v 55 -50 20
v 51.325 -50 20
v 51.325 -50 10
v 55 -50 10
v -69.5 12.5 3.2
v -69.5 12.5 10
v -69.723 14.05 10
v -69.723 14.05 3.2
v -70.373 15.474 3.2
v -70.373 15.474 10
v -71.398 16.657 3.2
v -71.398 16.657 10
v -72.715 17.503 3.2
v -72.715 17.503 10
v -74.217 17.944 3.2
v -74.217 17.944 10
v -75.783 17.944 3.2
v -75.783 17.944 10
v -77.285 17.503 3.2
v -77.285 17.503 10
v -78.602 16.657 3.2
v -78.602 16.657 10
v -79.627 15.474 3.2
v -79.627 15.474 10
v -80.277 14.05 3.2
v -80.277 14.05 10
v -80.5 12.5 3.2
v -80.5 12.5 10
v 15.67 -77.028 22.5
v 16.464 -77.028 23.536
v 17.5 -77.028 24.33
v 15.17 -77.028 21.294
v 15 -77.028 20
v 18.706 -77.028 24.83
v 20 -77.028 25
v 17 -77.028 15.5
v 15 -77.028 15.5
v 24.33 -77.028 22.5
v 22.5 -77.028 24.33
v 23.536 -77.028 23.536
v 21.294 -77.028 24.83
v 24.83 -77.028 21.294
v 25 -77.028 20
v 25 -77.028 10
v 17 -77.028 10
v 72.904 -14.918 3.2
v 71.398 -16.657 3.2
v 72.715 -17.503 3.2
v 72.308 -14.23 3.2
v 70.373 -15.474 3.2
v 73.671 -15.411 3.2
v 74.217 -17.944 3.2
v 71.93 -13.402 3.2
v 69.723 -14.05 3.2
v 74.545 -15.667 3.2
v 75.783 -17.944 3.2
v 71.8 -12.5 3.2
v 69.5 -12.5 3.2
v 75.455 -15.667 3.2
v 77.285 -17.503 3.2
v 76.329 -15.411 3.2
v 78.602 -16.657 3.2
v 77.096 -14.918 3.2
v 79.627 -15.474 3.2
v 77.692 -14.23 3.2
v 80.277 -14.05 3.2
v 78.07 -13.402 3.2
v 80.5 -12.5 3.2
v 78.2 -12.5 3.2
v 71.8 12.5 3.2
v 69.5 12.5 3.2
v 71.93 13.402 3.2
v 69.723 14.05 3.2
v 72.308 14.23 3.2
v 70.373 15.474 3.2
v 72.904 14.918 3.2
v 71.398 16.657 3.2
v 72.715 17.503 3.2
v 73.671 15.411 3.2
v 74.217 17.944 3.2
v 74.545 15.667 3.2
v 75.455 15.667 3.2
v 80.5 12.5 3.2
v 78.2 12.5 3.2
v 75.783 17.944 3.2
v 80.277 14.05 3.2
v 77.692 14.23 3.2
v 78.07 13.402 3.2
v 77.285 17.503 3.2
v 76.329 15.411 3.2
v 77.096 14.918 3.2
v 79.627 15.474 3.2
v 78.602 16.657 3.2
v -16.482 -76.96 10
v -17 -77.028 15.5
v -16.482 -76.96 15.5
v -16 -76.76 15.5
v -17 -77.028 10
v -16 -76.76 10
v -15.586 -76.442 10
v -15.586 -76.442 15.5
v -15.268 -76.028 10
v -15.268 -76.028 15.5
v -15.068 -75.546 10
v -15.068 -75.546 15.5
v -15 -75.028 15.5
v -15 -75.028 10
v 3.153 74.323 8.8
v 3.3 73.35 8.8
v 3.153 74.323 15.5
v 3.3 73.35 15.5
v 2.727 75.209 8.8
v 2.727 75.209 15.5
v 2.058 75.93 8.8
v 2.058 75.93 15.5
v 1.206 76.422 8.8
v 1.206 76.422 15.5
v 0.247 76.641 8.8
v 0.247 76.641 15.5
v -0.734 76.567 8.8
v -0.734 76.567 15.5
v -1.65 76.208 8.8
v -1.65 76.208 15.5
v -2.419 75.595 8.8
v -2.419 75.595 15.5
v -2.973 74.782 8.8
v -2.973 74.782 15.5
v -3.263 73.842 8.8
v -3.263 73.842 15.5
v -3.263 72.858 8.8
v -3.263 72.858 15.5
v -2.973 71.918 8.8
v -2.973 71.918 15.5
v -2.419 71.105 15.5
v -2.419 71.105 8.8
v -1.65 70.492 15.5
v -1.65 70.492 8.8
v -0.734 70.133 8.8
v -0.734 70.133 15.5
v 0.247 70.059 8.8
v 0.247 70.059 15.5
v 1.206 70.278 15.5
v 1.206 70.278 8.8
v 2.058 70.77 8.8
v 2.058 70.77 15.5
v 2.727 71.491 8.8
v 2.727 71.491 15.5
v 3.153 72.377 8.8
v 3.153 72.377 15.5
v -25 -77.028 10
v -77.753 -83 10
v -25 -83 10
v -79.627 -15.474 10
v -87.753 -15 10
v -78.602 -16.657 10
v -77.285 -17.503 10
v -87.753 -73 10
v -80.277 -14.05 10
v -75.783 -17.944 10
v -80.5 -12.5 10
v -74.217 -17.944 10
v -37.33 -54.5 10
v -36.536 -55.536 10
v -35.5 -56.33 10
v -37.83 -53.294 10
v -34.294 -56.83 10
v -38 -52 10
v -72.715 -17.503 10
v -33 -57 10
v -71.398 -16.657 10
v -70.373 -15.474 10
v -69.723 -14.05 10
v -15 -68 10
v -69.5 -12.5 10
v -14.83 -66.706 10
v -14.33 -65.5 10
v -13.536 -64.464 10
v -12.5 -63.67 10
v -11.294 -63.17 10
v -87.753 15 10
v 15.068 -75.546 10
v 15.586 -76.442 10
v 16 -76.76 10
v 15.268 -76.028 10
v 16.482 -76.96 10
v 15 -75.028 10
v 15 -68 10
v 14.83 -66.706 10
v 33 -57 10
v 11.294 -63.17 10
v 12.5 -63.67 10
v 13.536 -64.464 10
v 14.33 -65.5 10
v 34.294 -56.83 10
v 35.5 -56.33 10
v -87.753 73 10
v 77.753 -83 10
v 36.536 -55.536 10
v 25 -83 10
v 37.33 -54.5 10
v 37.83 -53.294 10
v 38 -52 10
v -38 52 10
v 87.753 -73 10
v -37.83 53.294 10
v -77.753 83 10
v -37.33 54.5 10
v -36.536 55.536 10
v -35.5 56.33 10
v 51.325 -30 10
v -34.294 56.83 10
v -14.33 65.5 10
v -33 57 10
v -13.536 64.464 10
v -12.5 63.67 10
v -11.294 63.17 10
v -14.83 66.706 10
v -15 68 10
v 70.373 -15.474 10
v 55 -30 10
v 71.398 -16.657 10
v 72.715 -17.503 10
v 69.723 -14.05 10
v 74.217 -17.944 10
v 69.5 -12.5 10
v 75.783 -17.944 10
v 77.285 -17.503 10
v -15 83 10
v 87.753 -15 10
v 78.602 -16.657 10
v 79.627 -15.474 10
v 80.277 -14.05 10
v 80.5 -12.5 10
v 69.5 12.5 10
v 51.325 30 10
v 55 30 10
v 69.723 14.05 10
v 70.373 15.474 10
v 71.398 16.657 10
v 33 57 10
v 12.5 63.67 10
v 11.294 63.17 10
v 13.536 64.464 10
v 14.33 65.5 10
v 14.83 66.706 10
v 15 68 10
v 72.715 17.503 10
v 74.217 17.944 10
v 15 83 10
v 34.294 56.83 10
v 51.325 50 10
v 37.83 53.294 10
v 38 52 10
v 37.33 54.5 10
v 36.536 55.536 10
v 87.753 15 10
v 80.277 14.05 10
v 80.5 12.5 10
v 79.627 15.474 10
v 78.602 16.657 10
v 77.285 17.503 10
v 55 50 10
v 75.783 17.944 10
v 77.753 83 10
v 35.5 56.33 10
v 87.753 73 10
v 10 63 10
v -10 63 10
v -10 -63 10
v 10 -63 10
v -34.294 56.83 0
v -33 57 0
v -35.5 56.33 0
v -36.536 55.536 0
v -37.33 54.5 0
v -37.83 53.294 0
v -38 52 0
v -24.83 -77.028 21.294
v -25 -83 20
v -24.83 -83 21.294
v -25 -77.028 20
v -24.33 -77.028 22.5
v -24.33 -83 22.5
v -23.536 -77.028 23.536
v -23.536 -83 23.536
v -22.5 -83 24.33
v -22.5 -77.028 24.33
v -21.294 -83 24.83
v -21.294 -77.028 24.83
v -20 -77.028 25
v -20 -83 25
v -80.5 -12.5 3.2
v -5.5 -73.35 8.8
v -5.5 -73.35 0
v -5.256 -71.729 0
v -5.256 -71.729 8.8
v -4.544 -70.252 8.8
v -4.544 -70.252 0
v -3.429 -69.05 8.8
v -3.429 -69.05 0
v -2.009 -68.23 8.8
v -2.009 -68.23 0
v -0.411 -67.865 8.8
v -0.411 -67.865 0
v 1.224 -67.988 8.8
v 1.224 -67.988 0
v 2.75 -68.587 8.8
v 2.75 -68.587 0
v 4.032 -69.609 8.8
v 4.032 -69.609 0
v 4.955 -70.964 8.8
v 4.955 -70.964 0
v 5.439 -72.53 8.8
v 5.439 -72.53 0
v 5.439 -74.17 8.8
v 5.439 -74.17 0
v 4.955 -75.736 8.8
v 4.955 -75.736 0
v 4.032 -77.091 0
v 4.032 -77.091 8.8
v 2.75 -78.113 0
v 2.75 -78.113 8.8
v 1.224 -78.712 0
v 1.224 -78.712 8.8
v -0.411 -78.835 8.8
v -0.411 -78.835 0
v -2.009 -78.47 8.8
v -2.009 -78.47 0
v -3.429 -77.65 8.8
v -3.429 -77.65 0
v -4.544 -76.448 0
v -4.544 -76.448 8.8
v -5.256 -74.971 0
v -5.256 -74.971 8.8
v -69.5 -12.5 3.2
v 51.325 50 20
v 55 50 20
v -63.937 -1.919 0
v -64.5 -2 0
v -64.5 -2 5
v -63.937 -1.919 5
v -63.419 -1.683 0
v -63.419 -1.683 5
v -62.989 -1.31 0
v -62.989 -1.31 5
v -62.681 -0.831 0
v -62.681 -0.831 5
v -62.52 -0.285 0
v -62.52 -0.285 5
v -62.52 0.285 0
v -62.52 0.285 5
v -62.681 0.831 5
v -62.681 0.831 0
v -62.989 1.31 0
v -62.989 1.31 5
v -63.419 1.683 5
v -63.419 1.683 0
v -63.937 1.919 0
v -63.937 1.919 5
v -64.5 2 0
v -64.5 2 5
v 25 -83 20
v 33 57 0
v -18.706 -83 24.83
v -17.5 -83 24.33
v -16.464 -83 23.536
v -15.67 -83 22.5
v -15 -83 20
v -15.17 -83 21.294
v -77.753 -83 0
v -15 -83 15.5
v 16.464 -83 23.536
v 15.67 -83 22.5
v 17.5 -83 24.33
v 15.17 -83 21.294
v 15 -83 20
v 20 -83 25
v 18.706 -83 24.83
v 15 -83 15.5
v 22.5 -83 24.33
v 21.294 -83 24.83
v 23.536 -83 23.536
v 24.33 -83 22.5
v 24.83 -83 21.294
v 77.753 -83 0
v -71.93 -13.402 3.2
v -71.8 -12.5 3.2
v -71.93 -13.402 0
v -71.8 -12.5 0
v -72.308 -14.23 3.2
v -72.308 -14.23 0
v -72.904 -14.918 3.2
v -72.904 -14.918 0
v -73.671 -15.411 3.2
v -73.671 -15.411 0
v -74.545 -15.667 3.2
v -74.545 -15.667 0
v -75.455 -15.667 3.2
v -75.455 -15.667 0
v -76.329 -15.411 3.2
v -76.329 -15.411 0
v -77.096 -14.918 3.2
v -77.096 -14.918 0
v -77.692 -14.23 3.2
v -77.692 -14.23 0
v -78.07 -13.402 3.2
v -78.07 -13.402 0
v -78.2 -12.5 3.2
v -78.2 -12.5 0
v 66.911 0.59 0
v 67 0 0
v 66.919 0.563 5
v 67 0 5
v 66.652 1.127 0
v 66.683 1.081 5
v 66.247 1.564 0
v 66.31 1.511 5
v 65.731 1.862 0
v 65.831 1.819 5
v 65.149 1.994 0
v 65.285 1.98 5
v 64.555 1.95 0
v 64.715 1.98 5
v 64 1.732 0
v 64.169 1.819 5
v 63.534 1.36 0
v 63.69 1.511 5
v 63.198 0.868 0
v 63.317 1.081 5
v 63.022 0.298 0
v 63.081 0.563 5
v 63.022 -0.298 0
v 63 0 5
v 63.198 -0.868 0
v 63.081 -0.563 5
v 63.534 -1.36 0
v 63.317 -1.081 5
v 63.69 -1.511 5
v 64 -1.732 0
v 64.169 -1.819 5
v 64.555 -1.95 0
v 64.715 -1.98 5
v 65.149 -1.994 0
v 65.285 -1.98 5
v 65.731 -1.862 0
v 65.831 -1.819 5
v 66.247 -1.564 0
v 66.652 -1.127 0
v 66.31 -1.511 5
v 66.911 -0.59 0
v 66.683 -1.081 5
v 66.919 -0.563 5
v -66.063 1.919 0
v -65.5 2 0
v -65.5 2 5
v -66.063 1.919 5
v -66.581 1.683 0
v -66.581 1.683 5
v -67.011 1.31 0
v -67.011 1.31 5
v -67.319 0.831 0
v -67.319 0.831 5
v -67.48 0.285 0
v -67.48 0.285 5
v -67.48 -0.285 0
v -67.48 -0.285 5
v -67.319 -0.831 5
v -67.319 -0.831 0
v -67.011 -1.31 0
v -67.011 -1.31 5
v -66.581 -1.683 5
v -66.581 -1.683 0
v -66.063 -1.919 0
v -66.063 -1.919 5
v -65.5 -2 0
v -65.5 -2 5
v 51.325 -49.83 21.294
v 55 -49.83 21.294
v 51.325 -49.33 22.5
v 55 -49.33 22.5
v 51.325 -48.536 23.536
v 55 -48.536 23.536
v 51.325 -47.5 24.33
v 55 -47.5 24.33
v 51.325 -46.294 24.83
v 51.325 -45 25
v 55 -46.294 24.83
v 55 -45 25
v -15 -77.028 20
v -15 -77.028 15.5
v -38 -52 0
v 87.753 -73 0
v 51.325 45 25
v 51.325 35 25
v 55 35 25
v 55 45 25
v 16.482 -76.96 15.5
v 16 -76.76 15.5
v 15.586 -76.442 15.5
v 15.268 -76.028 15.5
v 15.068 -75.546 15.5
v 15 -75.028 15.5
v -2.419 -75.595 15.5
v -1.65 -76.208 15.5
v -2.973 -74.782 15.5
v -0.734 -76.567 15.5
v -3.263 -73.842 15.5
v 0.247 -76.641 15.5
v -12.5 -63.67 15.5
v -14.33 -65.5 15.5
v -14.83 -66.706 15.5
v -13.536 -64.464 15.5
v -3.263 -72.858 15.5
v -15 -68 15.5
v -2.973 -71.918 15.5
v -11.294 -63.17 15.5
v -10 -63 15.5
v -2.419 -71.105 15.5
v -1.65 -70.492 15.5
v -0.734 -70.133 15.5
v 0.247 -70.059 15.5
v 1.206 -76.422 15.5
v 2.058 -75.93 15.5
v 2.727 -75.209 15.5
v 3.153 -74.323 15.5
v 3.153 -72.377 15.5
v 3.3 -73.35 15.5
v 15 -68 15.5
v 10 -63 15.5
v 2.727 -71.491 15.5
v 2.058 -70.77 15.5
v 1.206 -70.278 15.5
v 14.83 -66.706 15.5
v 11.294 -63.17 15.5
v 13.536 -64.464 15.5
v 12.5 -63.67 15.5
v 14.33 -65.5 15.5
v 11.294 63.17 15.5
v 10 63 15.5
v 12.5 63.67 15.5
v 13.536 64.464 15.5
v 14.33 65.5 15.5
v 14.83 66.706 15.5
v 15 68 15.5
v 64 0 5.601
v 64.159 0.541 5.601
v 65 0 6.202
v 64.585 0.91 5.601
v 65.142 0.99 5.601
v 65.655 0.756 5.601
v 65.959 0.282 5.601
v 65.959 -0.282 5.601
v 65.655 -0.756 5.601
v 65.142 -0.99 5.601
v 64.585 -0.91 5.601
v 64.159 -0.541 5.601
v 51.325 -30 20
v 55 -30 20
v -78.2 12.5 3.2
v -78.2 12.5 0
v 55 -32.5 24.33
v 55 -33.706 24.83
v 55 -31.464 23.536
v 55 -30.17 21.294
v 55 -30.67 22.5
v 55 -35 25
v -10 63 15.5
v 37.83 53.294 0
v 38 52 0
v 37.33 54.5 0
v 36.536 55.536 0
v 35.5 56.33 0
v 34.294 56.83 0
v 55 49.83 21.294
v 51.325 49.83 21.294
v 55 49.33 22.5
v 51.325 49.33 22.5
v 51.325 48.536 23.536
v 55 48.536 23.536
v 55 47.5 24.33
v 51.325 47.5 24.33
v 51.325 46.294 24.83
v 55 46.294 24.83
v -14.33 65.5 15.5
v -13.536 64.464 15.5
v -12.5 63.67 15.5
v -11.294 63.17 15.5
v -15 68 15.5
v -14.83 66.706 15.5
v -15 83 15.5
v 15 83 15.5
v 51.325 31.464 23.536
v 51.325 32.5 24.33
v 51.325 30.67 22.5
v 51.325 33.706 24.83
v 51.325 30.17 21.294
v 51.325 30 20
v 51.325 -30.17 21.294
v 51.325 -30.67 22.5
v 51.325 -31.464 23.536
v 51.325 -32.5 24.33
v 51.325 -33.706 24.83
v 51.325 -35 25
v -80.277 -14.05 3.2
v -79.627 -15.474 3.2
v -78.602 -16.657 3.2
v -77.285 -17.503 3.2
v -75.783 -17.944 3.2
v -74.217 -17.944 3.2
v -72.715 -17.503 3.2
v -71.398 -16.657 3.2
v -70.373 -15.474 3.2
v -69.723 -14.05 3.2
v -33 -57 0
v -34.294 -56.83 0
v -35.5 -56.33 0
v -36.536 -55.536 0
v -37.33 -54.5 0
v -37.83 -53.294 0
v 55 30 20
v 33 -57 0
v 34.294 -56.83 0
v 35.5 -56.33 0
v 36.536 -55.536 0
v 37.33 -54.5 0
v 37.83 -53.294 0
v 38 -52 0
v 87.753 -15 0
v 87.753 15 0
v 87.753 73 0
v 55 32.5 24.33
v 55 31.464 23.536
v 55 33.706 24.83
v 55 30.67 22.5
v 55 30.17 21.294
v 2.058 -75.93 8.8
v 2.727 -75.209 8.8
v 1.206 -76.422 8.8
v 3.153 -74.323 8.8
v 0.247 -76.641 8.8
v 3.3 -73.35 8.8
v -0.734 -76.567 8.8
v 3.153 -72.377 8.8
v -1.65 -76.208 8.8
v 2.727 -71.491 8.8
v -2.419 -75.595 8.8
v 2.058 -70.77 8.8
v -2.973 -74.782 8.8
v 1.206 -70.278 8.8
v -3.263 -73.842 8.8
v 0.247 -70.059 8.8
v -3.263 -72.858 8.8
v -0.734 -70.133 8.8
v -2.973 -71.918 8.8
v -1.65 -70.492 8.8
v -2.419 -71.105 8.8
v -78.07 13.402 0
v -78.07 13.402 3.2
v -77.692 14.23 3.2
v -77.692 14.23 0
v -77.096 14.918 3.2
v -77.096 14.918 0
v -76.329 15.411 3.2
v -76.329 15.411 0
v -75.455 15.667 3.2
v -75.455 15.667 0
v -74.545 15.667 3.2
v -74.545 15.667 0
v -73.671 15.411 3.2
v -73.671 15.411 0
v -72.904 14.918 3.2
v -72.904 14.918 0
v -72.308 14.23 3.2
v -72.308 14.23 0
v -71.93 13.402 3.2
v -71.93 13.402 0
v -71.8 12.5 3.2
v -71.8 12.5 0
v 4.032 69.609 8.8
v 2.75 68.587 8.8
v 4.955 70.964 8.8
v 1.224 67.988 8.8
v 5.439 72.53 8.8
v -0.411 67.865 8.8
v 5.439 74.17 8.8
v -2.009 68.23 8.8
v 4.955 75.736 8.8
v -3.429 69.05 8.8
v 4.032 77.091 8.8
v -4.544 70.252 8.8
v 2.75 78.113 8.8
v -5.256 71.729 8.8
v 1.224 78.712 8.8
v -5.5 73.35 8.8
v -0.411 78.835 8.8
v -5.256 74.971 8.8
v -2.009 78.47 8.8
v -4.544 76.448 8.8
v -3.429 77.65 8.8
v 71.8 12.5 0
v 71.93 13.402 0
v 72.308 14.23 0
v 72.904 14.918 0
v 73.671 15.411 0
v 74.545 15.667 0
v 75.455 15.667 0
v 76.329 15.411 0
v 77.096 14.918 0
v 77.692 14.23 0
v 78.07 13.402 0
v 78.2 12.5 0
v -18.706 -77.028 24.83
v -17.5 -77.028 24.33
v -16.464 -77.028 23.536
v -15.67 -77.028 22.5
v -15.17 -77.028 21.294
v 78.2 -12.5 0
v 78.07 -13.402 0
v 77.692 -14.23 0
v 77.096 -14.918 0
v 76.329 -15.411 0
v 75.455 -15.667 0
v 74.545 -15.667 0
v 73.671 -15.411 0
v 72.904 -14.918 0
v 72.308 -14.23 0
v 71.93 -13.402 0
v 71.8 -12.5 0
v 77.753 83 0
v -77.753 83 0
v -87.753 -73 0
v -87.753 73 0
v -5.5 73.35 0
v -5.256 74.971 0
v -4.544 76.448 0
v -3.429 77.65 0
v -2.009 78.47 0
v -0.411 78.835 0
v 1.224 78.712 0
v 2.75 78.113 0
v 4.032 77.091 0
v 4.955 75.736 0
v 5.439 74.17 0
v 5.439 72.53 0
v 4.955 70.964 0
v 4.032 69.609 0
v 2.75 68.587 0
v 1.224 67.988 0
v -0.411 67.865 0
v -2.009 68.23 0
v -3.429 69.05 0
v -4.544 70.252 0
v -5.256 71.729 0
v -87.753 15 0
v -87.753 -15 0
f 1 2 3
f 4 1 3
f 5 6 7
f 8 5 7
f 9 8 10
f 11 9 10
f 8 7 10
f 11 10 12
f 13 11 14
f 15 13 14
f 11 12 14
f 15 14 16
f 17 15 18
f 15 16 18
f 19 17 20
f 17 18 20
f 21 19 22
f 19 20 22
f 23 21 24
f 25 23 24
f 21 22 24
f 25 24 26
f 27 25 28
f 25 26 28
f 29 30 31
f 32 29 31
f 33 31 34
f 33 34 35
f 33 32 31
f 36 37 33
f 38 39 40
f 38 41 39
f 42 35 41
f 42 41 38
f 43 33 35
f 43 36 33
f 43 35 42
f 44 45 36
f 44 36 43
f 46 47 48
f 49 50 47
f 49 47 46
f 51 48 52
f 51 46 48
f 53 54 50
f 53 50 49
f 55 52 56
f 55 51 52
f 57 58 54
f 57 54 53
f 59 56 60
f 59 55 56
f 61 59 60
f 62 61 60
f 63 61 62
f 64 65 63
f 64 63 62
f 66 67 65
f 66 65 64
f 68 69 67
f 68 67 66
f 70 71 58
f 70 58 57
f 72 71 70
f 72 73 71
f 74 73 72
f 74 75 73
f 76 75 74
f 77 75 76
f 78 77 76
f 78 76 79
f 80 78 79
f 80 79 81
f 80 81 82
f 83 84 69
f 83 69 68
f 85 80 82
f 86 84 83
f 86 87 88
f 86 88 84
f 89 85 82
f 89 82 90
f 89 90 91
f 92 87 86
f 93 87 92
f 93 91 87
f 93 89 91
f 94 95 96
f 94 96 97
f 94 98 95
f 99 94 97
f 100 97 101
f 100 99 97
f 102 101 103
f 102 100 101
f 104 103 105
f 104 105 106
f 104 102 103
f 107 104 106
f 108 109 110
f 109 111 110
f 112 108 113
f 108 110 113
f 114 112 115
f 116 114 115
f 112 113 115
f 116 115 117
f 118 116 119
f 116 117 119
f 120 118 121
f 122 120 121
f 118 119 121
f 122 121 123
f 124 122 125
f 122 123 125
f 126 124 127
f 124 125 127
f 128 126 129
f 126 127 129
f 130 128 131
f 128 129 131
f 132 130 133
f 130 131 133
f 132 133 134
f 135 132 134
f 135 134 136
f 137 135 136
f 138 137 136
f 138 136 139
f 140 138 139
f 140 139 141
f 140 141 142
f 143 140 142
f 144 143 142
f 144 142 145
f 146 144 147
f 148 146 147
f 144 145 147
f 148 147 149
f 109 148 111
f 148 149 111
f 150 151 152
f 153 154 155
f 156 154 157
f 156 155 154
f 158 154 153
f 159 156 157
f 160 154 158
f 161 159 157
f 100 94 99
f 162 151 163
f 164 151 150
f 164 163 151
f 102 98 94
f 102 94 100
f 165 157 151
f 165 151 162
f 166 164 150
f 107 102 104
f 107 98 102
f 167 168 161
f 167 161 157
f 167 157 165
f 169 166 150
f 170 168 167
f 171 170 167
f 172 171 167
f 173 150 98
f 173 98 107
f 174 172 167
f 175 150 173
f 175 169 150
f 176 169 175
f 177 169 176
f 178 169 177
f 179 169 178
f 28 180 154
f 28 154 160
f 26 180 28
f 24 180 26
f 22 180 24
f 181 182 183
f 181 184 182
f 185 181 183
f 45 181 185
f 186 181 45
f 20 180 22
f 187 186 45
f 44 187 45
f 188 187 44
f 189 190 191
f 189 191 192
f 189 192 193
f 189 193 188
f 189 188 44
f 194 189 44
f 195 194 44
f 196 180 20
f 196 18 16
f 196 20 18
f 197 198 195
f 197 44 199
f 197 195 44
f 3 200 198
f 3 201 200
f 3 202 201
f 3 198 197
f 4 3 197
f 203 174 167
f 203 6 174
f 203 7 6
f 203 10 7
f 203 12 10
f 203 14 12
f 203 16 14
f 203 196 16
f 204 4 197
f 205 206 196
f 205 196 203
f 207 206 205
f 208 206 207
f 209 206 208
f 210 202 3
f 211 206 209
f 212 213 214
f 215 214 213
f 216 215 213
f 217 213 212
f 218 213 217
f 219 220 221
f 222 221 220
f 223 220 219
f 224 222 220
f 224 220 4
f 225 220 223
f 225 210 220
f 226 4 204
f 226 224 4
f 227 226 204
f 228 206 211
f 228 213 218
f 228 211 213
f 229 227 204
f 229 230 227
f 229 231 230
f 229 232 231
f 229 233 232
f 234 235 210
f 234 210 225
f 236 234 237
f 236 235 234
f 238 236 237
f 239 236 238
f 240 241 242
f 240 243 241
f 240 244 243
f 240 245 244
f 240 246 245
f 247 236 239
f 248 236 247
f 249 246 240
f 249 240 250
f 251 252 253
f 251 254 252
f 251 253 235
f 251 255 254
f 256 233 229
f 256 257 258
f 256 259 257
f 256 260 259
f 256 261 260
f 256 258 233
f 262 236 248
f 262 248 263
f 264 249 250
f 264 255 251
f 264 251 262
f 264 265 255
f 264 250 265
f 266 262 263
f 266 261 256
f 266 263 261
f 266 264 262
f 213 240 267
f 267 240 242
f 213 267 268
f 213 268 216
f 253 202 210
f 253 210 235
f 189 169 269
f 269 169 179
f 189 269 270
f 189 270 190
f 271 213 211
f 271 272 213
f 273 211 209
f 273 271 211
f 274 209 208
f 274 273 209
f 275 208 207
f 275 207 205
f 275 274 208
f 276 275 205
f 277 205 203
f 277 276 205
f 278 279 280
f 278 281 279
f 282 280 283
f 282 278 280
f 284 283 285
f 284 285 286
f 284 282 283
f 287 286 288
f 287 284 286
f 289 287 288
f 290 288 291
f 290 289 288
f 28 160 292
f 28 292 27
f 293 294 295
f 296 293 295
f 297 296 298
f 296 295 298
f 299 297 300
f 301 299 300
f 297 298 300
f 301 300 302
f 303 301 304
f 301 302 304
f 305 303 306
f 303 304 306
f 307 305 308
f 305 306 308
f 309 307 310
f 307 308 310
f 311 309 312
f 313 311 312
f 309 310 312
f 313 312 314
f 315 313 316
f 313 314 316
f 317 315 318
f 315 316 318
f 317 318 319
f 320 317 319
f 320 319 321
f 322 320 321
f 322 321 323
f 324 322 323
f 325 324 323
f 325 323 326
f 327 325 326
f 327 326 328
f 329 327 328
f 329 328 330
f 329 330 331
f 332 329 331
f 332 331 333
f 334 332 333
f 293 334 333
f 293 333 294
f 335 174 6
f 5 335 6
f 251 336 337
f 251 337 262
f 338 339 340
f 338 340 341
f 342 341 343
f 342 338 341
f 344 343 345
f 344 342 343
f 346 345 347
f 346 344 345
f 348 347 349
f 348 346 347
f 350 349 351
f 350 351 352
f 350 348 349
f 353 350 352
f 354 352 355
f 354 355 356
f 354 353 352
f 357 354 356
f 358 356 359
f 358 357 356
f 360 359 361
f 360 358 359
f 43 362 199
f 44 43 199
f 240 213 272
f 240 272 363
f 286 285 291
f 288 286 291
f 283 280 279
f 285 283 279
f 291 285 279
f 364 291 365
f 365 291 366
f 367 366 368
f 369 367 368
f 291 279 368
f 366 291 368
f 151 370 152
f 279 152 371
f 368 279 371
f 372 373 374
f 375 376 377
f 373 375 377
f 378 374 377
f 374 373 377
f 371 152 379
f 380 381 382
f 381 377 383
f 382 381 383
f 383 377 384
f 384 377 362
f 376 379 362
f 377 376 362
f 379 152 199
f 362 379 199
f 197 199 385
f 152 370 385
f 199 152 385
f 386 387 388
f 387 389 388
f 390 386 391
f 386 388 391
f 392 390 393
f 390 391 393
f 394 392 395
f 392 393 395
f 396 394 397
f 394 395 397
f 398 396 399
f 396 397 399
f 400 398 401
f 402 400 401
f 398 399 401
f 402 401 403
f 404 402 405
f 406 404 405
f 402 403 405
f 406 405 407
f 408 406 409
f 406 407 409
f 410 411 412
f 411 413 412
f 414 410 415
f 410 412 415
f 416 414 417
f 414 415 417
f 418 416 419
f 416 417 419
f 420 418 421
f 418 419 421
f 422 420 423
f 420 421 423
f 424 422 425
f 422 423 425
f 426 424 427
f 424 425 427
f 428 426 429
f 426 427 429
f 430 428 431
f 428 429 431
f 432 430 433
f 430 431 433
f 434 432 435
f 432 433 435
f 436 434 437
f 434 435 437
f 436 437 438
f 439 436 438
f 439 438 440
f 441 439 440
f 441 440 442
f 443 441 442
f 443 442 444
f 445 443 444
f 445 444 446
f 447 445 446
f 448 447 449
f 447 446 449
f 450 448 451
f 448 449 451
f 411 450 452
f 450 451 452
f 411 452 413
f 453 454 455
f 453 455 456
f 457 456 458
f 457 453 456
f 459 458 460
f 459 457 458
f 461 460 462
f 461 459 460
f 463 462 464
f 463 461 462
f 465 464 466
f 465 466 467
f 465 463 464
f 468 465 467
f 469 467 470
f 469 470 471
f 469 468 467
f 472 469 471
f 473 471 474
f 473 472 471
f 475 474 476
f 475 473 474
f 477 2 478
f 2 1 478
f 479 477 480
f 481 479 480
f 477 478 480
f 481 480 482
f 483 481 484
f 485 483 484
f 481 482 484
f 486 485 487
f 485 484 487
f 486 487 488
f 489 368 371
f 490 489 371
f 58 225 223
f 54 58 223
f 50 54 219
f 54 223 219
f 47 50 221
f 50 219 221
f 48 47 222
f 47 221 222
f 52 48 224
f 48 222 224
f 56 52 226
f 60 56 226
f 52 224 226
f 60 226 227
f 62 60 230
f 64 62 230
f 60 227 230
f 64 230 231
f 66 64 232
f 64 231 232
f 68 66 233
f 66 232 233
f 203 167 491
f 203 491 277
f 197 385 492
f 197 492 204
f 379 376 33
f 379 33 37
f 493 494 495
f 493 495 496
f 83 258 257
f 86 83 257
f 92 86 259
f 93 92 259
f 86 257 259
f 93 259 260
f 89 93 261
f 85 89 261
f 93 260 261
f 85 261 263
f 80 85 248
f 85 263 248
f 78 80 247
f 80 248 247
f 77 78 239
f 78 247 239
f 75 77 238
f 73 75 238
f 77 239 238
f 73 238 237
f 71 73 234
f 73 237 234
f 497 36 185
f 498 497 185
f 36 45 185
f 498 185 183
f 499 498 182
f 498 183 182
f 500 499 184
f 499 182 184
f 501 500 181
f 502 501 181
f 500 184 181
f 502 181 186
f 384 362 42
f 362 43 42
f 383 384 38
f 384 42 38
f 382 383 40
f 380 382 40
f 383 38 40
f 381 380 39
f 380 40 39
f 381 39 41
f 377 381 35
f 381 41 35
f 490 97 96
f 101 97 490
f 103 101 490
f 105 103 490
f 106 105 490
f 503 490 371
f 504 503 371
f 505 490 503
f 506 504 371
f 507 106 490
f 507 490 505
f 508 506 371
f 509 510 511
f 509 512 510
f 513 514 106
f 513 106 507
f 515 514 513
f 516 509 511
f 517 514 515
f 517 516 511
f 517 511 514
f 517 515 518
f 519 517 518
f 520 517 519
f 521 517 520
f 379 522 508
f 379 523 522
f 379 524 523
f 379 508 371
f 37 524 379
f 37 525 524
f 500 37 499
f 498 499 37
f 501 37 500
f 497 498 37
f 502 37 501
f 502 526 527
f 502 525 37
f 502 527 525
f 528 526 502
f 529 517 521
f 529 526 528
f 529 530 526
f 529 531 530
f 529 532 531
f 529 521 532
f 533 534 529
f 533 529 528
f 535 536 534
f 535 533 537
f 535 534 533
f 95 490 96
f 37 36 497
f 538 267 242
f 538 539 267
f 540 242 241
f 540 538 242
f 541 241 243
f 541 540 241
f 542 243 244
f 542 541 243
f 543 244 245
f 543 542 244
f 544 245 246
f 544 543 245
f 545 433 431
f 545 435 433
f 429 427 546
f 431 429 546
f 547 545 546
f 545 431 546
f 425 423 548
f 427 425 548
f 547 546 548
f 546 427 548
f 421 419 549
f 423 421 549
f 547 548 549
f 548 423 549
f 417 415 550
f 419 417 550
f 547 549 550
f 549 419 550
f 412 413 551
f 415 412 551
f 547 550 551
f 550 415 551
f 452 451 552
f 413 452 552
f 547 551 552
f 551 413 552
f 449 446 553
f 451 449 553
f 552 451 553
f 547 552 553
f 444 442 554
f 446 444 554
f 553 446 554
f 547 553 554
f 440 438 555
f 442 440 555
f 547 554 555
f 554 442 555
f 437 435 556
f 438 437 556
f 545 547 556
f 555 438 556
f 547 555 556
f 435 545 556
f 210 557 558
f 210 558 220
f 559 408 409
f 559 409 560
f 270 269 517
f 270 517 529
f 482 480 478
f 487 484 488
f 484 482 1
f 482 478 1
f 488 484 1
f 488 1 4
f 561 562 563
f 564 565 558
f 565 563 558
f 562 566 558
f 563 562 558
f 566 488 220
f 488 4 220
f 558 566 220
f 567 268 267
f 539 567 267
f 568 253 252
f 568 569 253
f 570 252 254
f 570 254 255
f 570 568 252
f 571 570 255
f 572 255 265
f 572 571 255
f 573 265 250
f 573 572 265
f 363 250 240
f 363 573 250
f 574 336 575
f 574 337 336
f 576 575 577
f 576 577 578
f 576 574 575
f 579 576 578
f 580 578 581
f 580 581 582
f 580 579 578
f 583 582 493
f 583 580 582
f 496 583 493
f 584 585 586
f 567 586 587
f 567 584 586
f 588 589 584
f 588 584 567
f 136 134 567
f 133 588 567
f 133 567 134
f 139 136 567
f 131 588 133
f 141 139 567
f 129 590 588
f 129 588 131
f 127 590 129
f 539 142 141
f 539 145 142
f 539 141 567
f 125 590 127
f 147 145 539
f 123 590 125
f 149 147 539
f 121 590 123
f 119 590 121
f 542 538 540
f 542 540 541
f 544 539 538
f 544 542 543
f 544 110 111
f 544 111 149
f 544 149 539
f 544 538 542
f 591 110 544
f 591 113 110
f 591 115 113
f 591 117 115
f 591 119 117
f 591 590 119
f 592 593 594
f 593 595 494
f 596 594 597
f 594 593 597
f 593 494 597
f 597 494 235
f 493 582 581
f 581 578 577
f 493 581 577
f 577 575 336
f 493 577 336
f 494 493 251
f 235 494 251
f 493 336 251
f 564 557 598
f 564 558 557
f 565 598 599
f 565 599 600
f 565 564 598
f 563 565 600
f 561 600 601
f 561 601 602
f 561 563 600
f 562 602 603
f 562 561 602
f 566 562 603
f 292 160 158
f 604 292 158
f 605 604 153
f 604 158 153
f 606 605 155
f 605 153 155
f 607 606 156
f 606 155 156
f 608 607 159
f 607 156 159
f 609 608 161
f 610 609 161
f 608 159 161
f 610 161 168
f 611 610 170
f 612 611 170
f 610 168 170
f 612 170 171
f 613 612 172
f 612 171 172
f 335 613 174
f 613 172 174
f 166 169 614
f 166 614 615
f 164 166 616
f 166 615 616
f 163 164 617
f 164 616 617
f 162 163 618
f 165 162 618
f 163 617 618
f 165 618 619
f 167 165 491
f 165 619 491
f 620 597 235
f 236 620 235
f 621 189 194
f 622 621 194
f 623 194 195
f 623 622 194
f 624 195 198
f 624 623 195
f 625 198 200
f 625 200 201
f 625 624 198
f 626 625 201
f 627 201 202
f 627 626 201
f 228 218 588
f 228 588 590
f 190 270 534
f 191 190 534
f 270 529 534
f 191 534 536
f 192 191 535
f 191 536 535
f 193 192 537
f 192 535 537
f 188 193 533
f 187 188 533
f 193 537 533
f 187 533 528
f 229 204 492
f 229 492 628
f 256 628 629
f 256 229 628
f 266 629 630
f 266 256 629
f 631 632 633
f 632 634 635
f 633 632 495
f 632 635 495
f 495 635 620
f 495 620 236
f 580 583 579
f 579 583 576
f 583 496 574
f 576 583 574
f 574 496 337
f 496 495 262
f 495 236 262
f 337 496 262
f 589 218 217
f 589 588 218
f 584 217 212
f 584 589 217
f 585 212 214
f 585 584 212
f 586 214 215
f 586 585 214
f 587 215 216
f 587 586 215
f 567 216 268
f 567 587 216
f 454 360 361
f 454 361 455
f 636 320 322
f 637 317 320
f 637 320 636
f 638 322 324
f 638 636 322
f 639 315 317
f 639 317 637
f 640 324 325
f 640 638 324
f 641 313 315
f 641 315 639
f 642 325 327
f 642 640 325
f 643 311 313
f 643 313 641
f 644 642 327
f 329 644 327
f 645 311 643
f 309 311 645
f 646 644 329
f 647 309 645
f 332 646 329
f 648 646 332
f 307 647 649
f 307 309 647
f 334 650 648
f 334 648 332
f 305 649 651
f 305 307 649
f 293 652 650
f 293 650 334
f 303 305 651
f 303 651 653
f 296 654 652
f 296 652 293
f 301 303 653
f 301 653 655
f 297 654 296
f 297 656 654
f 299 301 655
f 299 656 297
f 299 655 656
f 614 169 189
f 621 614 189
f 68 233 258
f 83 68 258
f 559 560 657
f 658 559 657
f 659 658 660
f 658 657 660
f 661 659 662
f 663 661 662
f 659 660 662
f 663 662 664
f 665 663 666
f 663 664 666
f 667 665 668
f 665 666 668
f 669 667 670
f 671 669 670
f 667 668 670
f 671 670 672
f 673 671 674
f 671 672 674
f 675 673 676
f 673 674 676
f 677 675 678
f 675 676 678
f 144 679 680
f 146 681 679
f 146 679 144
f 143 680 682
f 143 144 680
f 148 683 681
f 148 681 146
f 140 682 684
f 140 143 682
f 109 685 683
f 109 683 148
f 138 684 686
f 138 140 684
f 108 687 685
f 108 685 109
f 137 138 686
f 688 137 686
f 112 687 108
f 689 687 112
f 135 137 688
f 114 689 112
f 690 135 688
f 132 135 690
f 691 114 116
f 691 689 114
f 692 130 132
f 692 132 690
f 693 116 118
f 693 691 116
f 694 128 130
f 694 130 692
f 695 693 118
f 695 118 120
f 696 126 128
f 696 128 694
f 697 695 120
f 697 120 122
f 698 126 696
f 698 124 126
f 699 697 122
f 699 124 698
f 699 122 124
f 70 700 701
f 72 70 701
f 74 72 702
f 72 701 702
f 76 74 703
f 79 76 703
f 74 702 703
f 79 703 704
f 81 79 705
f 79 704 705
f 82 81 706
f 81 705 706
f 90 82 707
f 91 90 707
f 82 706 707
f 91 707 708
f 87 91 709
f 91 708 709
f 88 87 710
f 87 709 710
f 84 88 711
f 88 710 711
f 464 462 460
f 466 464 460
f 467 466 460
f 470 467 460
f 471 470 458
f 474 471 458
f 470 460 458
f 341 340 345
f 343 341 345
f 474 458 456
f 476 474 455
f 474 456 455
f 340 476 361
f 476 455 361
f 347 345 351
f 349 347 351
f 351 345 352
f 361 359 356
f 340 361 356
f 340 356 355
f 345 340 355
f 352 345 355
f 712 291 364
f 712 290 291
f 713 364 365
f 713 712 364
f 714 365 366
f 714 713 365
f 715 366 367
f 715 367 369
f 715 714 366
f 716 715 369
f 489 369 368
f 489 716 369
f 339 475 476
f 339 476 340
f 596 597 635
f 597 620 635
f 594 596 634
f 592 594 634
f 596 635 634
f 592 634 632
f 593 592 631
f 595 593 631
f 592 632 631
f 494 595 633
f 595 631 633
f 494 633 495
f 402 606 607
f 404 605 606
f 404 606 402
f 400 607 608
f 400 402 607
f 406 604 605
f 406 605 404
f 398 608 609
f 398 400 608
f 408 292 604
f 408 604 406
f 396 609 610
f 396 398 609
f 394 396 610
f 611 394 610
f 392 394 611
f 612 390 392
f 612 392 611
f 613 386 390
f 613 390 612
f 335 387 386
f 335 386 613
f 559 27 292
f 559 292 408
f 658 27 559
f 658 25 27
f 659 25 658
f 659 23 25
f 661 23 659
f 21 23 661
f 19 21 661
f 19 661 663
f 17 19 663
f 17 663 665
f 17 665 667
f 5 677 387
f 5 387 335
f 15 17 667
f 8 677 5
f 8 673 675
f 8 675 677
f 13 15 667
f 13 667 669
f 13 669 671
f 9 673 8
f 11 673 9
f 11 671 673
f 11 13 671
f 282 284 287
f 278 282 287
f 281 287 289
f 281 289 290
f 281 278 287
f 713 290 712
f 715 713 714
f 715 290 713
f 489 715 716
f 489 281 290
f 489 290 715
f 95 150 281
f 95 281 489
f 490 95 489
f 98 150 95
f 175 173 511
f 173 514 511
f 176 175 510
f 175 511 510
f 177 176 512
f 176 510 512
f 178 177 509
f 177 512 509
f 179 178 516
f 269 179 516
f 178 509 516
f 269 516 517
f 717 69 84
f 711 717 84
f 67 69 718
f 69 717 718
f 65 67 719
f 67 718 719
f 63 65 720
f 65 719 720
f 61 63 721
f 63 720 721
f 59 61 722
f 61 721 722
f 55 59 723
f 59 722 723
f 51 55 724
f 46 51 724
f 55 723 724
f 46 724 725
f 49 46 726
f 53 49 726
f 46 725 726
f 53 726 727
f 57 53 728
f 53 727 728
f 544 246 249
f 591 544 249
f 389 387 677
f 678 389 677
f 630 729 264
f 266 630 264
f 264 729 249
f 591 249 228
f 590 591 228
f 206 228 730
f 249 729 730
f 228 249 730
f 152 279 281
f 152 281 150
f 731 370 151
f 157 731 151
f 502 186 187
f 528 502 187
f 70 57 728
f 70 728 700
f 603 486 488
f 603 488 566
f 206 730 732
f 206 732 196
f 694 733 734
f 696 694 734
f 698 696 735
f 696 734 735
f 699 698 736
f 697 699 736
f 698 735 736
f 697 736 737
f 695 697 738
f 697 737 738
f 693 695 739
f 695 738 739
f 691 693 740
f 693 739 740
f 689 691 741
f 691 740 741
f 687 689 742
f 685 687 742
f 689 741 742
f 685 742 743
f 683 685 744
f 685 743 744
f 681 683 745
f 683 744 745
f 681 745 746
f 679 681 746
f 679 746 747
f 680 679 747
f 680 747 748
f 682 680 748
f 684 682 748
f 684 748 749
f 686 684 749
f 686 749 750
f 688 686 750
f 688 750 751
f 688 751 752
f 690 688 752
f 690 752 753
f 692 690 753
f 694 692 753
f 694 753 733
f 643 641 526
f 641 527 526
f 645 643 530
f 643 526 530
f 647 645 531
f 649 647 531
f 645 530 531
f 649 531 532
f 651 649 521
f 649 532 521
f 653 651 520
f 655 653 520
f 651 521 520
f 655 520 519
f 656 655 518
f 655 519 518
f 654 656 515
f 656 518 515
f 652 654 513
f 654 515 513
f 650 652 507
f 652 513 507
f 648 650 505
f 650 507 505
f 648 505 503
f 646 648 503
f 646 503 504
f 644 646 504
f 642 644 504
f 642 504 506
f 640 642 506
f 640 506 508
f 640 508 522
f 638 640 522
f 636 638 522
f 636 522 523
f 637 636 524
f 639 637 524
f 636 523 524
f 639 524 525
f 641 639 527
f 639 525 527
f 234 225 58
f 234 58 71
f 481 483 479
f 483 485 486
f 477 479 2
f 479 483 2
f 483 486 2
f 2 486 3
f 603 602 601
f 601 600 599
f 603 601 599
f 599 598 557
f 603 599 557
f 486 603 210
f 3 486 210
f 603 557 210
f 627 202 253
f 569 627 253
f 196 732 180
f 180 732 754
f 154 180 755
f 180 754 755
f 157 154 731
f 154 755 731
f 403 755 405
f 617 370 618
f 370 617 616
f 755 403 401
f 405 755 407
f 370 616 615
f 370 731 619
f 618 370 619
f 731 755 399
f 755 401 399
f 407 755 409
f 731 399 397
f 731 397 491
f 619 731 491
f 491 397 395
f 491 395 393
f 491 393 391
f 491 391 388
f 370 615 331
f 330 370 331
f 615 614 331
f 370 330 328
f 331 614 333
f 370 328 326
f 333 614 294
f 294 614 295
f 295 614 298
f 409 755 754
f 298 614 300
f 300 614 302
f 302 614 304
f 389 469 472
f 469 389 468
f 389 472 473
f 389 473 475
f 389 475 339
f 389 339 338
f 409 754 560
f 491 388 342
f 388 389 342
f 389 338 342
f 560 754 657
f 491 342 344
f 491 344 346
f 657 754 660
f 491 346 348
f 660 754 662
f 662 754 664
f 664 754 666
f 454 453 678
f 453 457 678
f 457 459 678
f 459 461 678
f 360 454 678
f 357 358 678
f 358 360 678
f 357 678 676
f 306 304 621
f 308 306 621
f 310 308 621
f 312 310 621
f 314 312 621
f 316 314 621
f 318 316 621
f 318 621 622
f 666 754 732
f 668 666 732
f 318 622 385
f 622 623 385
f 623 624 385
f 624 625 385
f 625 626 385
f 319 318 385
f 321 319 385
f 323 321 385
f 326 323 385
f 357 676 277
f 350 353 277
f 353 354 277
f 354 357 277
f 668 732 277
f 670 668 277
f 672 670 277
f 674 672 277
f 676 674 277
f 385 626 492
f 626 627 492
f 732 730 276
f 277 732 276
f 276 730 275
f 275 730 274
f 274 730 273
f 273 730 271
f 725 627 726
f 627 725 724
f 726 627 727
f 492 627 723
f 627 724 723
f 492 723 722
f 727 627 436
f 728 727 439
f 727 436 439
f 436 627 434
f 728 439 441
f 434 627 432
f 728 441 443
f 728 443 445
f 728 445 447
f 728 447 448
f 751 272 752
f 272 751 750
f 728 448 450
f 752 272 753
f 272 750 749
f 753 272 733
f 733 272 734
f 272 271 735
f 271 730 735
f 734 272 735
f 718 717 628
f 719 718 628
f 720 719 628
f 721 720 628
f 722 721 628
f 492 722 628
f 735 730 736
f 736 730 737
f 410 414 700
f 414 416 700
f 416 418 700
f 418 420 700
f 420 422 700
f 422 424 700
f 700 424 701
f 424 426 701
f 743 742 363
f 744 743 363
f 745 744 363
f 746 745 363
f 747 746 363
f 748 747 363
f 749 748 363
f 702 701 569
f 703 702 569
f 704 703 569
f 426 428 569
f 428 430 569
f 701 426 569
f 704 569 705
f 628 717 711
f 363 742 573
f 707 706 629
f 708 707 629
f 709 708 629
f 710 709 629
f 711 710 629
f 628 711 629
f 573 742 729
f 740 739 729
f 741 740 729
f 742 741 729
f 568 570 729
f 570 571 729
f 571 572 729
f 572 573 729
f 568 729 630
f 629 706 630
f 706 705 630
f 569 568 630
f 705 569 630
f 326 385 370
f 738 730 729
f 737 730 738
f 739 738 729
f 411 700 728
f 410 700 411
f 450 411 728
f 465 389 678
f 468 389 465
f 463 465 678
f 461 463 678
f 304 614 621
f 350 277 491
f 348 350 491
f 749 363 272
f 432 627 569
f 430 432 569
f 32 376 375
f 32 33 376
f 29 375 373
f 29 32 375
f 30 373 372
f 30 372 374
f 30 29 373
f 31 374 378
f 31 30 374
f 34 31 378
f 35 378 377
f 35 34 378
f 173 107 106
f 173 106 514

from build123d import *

# Parameters (mm, degrees)
SKETCH_1_W                            = 110
SKETCH_1_H                            = 166
EXTRUDE_1_DEPTH                       = 10
SKETCH_2_W                            = 30
SKETCH_2_H                            = 20
EXTRUDE_2_DEPTH                       = 5.5
HOLE_WIZARD_2_D                       = 6.6
HOLE_WIZARD_2_CBORE_D                 = 11
HOLE_WIZARD_2_CBORE_DEPTH             = 8.8
FILLET_2_R                            = 15
FILLET_3_R                            = 5
SKETCH_9_W                            = 76
SKETCH_9_H                            = 114
CUT_EXTRUDE_1_DEPTH                   = 101.069975517
FILLET_4_R                            = 5
SKETCH_11_W                           = 32.752695491
SKETCH_11_H                           = 40
EXTRUDE_4_DEPTH                       = 10
HOLE_WIZARD_2_2_D                     = 6.4
HOLE_WIZARD_2_2_CBORE_D               = 11
HOLE_WIZARD_2_2_CBORE_DEPTH           = 6.8
HOLE_WIZARD_2_2_ON_FACE_2_D           = 6.4
HOLE_WIZARD_2_2_ON_FACE_2_CBORE_D     = 11
HOLE_WIZARD_2_2_ON_FACE_2_CBORE_DEPTH = 6.8
SKETCH_14_W                           = 11
SKETCH_14_H                           = 25
CUT_EXTRUDE_3_DEPTH                   = 6.8
FILLET_5_R                            = 5
SKETCH_16_W                           = 6.4
SKETCH_16_H                           = 25
CUT_EXTRUDE_5_DEPTH                   = 122.411801593
SKETCH_17_W                           = 10
SKETCH_17_H                           = 15
EXTRUDE_5_DEPTH                       = 5.971999808
EXTRUDE_START                         = -3.675
SKETCH_18_W                           = 15
SKETCH_18_H                           = 20
EXTRUDE_6_DEPTH                       = 3.675
FILLET_6_R                            = 5
FILLET_7_R                            = 2
MM_1_D                                = 4
MM_1_DEPTH                            = 5
MM_1_TIP                              = 1.201721238
CUT_EXTRUDE_6_DEPTH                   = 5
EXTRUDE_START_2                       = -10
EXTRUDE_7_DEPTH                       = 10
CHAMFER_1_SIZE                        = 10


with BuildPart() as part:
    # 草图1 → 凸台-拉伸1 (new body)
    with BuildSketch(Plane.XY):
        Rectangle(SKETCH_1_W, SKETCH_1_H)
    extrude(amount=EXTRUDE_1_DEPTH)

    # 草图2 → 凸台-拉伸2 (add)
    with BuildSketch(Plane.XY.offset(10)):
        with Locations((0, -73)):
            Rectangle(SKETCH_2_W, SKETCH_2_H)
        with Locations((0, 73)):
            Rectangle(SKETCH_2_W, SKETCH_2_H)
    extrude(amount=EXTRUDE_2_DEPTH)

    # Hole Wizard 2 (through all)
    with Locations(Plane(origin=(0, 0, 0), x_dir=(-1, 0, 0), z_dir=(0, 0, -1))):
        with Locations((0, -73.35), (0, 73.35)):
            CounterBoreHole(HOLE_WIZARD_2_D / 2, HOLE_WIZARD_2_CBORE_D / 2, HOLE_WIZARD_2_CBORE_DEPTH)

    # 圆角2
    fillet_2_edges = [part.edges().sort_by_distance(p)[0] for p in [
        (55, -83, 5),
        (-55, -83, 5),
        (-55, 83, 5),
        (55, 83, 5),
    ]]
    fillet(fillet_2_edges, radius=FILLET_2_R)

    # 圆角3
    fillet_3_edges = [part.edges().sort_by_distance(p)[0] for p in [
        (-15, -63, 12.75),
        (15, -63, 12.75),
        (-15, 63, 12.75),
        (15, 63, 12.75),
    ]]
    fillet(fillet_3_edges, radius=FILLET_3_R)

    # 草图9 → 切除-拉伸1 (cut, through all)
    with BuildSketch(Plane.XY.offset(10)):
        Rectangle(SKETCH_9_W, SKETCH_9_H)
    extrude(amount=-CUT_EXTRUDE_1_DEPTH, mode=Mode.SUBTRACT)

    # 圆角4
    fillet_4_edges = [part.edges().sort_by_distance(p)[0] for p in [
        (38, 57, 5),
        (38, -57, 5),
        (-38, -57, 5),
        (-38, 57, 5),
    ]]
    fillet(fillet_4_edges, radius=FILLET_4_R)

    # 草图11 → 凸台-拉伸4 (add)
    with BuildSketch(Plane.XY.offset(10)):
        with Locations((-71.376347745, 0)):
            Rectangle(SKETCH_11_W, SKETCH_11_H)
        with Locations((71.376347745, 0)):
            Rectangle(SKETCH_11_W, SKETCH_11_H)
    extrude(amount=-EXTRUDE_4_DEPTH)

    # Hole Wizard 2 2 (through all)
    with Locations(Plane(origin=(75, -12.5, 10), x_dir=(1, 0, 0), z_dir=(0, 0, 1))):
        with Locations((0, 0), (-150, 25), (-150, 0), (0, 25)):
            CounterBoreHole(HOLE_WIZARD_2_2_D / 2, HOLE_WIZARD_2_2_CBORE_D / 2, HOLE_WIZARD_2_2_CBORE_DEPTH)

    # Hole Wizard 2 2 on face 2 (through all)
    with Locations(Plane(origin=(-121.442232178, 88.770272999, 0), x_dir=(1, 0, 0), z_dir=(0, 0, 1))):
        with Locations((0, 0)):
            CounterBoreHole(HOLE_WIZARD_2_2_ON_FACE_2_D / 2, HOLE_WIZARD_2_2_ON_FACE_2_CBORE_D / 2, HOLE_WIZARD_2_2_ON_FACE_2_CBORE_DEPTH)

    # 草图14 → 切除-拉伸3 (cut)
    with BuildSketch(Plane.XY.offset(10)):
        with Locations((-75, 0)):
            Rectangle(SKETCH_14_W, SKETCH_14_H)
        with Locations((75, 0)):
            Rectangle(SKETCH_14_W, SKETCH_14_H)
    extrude(amount=-CUT_EXTRUDE_3_DEPTH, mode=Mode.SUBTRACT)

    # 圆角5
    fillet_5_edges = [part.edges().sort_by_distance(p)[0] for p in [
        (-87.752695491, 20, 5),
        (-87.752695491, -20, 5),
        (-55, -20, 5),
        (-55, 20, 5),
        (55, -20, 5),
        (87.752695491, -20, 5),
        (87.752695491, 20, 5),
        (55, 20, 5),
    ]]
    fillet(fillet_5_edges, radius=FILLET_5_R)

    # 草图16 → 切除-拉伸5 (cut, through all)
    with BuildSketch(Plane.XY.offset(3.2)):
        with Locations((-75, 0)):
            Rectangle(SKETCH_16_W, SKETCH_16_H)
        with Locations((75, 0)):
            Rectangle(SKETCH_16_W, SKETCH_16_H)
    extrude(amount=-CUT_EXTRUDE_5_DEPTH, mode=Mode.SUBTRACT)

    # 草图17 → 凸台-拉伸5 (add)
    with BuildSketch(Plane(origin=(0, -83, 0), x_dir=(1, 0, 0), z_dir=(0, 1, 0))):
        with Locations((-20, -17.5)):
            Rectangle(SKETCH_17_W, SKETCH_17_H)
        with Locations((20, -17.5)):
            Rectangle(SKETCH_17_W, SKETCH_17_H)
    extrude(amount=EXTRUDE_5_DEPTH)

    # 草图18 → 凸台-拉伸6 (add)
    with BuildSketch(Plane(origin=(55, 0, 0), x_dir=(0, 0, -1), z_dir=(1, 0, 0)).offset(EXTRUDE_START)):
        with Locations((-17.5, 40)):
            Rectangle(SKETCH_18_W, SKETCH_18_H)
        with Locations((-17.5, -40)):
            Rectangle(SKETCH_18_W, SKETCH_18_H)
    extrude(amount=EXTRUDE_6_DEPTH)

    # 圆角6
    fillet_6_edges = [part.edges().sort_by_distance(p)[0] for p in [
        (53.1625, 50, 25),
        (53.1625, 30, 25),
        (53.1625, -30, 25),
        (53.1625, -50, 25),
        (25, -80.014000096, 25),
        (15, -80.014000096, 25),
        (-15, -80.014000096, 25),
        (-25, -80.014000096, 25),
    ]]
    fillet(fillet_6_edges, radius=FILLET_6_R - 0.0001)  # a hair under: the kernel refuses the full size

    # 圆角7
    fillet_7_edges = [part.edges().sort_by_distance(p)[0] for p in [
        (-15, -77.028000192, 12.75),
        (15, -77.028000192, 12.75),
    ]]
    fillet(fillet_7_edges, radius=FILLET_7_R)

    # 大小mm 暗销孔1
    with Locations(Plane(origin=(65, 0, 0), x_dir=(-1, 0, 0), z_dir=(0, 0, -1))):
        with Locations((0, 0)):
            Hole(MM_1_D / 2, depth=MM_1_DEPTH)
            with Locations((0, 0, -(MM_1_DEPTH + MM_1_TIP / 2))):  # 118° drill point
                Cone(0, MM_1_D / 2, MM_1_TIP, mode=Mode.SUBTRACT)

    # 草图21 → 切除-拉伸6 (cut)
    with BuildSketch(Plane(origin=(0, 0, 0), x_dir=(-1, 0, 0), z_dir=(0, 0, -1))):
        with BuildLine():
            Line((65.5, -2), (64.5, -2))
            ThreePointArc((64.5, -2), (62.5, 0), (64.5, 2))
            Line((64.5, 2), (65.5, 2))
            ThreePointArc((65.5, 2), (67.5, 0), (65.5, -2))
        make_face()
    extrude(amount=-CUT_EXTRUDE_6_DEPTH, mode=Mode.SUBTRACT)

    # 草图23 → 凸台-拉伸7 (add)
    with BuildSketch(Plane.XY.offset(10).offset(EXTRUDE_START_2)):
        with BuildLine():
            Line((-40, 83), (-87.752695491, 83))
            Line((-87.752695491, 83), (-87.752695491, 15))
            ThreePointArc((-87.752695491, 15), (-86.288229397, 18.535533906), (-82.752695491, 20))
            Line((-82.752695491, 20), (-60, 20))
            ThreePointArc((-60, 20), (-56.464466094, 21.464466094), (-55, 25))
            Line((-55, 25), (-55, 68))
            ThreePointArc((-55, 68), (-50.606601718, 78.606601718), (-40, 83))
        make_face()
        with BuildLine():
            ThreePointArc((-82.752695491, -20), (-86.288229397, -18.535533906), (-87.752695491, -15))
            Line((-87.752695491, -15), (-87.752695491, -83))
            Line((-87.752695491, -83), (-40, -83))
            ThreePointArc((-40, -83), (-50.606601718, -78.606601718), (-55, -68))
            Line((-55, -68), (-55, -25))
            ThreePointArc((-55, -25), (-56.464466094, -21.464466094), (-60, -20))
            Line((-60, -20), (-82.752695491, -20))
        make_face()
        with BuildLine():
            Line((87.752695491, -83), (87.752695491, -15))
            ThreePointArc((87.752695491, -15), (86.288229397, -18.535533906), (82.752695491, -20))
            Line((82.752695491, -20), (60, -20))
            ThreePointArc((60, -20), (56.464466094, -21.464466094), (55, -25))
            Line((55, -25), (55, -30))
            Line((55, -30), (51.324999949, -30))
            Line((51.324999949, -30), (51.324999949, -50))
            Line((51.324999949, -50), (55, -50))
            Line((55, -50), (55, -68))
            ThreePointArc((55, -68), (50.606601718, -78.606601718), (40, -83))
            Line((40, -83), (87.752695491, -83))
        make_face()
        with BuildLine():
            Line((87.752695491, 83), (40, 83))
            ThreePointArc((40, 83), (50.606601718, 78.606601718), (55, 68))
            Line((55, 68), (55, 50))
            Line((55, 50), (51.324999949, 50))
            Line((51.324999949, 50), (51.324999949, 30))
            Line((51.324999949, 30), (55, 30))
            Line((55, 30), (55, 25))
            ThreePointArc((55, 25), (56.464466094, 21.464466094), (60, 20))
            Line((60, 20), (82.752695491, 20))
            ThreePointArc((82.752695491, 20), (86.288229397, 18.535533906), (87.752695491, 15))
            Line((87.752695491, 15), (87.752695491, 83))
        make_face()
    extrude(amount=EXTRUDE_7_DEPTH)

    # 倒角1
    chamfer_1_edges = [part.edges().sort_by_distance(p)[0] for p in [
        (-87.752695491, 83, 5),
        (-87.752695491, -83, 5),
        (87.752695491, -83, 5),
        (87.752695491, 83, 5),
    ]]
    chamfer(chamfer_1_edges, length=CHAMFER_1_SIZE)


solid = part.part
